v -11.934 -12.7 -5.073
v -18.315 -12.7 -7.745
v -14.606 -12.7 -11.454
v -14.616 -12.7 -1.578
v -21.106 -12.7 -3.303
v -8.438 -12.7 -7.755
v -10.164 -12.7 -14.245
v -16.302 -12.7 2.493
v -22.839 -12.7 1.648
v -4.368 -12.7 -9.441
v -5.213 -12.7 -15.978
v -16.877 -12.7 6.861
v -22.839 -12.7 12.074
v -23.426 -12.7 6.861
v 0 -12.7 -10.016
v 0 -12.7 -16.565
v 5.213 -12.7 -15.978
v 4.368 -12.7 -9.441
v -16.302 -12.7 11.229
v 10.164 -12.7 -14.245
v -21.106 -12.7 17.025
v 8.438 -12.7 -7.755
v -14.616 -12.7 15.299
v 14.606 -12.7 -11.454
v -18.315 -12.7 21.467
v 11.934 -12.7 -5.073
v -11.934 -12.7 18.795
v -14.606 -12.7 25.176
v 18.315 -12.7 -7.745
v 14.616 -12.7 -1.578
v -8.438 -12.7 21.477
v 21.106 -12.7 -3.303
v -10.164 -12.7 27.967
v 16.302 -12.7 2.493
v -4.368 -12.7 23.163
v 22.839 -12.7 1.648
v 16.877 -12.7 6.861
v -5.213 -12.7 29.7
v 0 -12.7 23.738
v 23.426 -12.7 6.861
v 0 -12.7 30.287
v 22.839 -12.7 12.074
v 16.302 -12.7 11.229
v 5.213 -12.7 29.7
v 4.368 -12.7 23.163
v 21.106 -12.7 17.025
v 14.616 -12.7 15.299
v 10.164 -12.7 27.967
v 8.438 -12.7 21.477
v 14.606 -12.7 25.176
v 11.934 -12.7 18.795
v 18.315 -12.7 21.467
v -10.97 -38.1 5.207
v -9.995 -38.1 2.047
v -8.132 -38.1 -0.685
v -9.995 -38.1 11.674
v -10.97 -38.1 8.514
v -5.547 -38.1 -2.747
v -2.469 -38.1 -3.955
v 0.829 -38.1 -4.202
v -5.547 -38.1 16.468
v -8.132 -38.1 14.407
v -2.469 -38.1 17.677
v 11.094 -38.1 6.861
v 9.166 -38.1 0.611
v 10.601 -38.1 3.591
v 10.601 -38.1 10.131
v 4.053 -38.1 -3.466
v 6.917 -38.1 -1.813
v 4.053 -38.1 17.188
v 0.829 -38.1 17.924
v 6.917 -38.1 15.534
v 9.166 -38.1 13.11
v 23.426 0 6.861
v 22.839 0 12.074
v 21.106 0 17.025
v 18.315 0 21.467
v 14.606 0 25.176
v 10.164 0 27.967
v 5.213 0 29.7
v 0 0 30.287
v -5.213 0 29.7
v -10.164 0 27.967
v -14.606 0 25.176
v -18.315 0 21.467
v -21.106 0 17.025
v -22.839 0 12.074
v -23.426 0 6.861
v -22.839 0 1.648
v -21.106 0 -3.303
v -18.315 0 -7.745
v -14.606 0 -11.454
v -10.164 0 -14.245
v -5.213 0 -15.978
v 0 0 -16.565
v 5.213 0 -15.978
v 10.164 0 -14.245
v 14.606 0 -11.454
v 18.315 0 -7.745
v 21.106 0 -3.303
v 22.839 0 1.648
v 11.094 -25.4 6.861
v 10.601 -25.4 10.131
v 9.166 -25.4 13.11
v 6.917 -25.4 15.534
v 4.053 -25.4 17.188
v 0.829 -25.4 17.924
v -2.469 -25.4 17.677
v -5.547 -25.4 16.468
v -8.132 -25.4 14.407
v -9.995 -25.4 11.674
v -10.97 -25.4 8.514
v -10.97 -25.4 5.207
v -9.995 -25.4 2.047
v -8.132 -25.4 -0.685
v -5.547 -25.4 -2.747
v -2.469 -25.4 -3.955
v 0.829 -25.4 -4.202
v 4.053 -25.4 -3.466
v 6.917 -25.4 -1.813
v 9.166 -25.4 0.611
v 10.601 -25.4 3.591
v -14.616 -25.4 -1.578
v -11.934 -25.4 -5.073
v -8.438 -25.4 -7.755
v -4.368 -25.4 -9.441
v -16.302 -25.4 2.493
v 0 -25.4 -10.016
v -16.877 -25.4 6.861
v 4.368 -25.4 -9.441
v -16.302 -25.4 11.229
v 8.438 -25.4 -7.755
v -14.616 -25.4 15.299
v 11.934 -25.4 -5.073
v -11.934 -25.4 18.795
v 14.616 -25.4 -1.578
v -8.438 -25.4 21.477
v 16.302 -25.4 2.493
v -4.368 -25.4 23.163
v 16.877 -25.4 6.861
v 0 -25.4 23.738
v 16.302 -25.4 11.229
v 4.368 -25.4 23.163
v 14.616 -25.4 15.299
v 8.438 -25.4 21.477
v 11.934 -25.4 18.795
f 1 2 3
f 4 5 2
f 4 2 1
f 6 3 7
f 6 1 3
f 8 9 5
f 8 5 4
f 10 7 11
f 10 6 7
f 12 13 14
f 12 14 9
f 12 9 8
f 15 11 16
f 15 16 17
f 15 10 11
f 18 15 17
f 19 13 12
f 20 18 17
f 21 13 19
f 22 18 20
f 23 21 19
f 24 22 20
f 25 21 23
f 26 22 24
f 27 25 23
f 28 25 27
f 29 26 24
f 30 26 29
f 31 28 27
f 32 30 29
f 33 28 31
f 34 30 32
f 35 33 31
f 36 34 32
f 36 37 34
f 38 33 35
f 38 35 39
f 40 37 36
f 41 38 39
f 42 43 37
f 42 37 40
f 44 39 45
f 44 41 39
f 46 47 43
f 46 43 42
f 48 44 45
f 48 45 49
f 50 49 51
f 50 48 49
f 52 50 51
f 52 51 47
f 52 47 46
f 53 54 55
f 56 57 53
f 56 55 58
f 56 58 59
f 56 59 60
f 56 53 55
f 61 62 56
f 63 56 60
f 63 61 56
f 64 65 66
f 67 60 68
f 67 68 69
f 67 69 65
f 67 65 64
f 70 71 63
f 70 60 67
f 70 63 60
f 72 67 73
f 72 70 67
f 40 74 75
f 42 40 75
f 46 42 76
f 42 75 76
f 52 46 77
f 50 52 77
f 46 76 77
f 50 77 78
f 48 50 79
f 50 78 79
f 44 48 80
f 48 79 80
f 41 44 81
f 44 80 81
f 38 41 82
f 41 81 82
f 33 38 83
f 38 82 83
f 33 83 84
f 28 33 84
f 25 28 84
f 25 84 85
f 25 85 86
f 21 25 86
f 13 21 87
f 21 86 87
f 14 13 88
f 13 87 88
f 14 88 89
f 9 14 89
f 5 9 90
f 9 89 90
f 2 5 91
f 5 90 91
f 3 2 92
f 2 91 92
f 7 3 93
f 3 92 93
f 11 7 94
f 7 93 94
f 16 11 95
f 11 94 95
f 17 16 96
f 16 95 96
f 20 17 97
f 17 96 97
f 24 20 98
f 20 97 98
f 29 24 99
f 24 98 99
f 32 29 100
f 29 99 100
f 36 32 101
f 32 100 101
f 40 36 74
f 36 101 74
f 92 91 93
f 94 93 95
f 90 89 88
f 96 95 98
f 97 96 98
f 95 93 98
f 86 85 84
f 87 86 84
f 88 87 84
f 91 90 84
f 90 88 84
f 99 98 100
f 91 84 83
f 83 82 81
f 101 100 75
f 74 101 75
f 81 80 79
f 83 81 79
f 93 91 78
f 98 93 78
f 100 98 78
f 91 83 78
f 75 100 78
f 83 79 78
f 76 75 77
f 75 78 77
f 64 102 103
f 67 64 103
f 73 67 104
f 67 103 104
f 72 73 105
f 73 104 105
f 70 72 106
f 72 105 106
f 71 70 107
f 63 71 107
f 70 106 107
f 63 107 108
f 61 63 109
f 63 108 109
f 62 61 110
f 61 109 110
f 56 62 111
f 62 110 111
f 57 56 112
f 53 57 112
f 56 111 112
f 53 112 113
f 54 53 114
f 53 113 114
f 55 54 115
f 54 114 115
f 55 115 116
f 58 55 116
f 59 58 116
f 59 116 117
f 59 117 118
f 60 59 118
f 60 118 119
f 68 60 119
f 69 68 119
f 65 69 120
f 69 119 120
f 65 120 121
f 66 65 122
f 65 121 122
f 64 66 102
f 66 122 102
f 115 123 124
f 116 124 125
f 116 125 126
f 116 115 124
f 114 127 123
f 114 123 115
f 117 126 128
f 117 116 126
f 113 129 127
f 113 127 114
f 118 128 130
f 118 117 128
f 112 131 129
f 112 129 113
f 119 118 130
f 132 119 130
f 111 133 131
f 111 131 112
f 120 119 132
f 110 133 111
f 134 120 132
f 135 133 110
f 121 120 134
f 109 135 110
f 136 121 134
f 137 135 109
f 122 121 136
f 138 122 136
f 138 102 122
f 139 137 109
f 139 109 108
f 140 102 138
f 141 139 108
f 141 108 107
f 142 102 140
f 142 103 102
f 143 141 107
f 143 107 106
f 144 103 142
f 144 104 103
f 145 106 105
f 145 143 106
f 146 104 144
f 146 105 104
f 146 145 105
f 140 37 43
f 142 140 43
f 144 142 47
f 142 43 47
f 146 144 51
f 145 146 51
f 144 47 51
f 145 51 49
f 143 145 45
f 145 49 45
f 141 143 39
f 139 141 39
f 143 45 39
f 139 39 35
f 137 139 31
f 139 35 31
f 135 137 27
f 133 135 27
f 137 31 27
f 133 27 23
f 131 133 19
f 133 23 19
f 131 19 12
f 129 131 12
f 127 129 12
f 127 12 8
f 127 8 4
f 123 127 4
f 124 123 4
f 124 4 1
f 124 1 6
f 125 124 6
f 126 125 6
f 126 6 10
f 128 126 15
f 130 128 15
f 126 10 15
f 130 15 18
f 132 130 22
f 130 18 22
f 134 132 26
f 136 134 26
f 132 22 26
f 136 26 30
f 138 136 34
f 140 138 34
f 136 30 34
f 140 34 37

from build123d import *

# Parameters (mm, degrees)
F0_R     = 23.426131
F1_DEPTH = 12.7
F2_R     = 16.876877
F3_DEPTH = 12.7
F4_R     = 11.09388
F5_DEPTH = 12.7


with BuildPart() as f1:
    # F0 (on Front) → F1 (new body)
    with BuildSketch(Plane.XZ):
        with Locations((0, 6.860897)):
            Circle(F0_R)
    extrude(amount=F1_DEPTH)

    # F2 (on face) → F3 (join)
    with BuildSketch(Plane.XZ.offset(12.7)):
        with Locations((0, 6.860897)):
            Circle(F2_R)
    extrude(amount=F3_DEPTH)

    # F4 (on face) → F5 (join)
    with BuildSketch(Plane.XZ.offset(25.4)):
        with Locations((0, 6.860897)):
            Circle(F4_R)
    extrude(amount=F5_DEPTH)


solid = f1.part
